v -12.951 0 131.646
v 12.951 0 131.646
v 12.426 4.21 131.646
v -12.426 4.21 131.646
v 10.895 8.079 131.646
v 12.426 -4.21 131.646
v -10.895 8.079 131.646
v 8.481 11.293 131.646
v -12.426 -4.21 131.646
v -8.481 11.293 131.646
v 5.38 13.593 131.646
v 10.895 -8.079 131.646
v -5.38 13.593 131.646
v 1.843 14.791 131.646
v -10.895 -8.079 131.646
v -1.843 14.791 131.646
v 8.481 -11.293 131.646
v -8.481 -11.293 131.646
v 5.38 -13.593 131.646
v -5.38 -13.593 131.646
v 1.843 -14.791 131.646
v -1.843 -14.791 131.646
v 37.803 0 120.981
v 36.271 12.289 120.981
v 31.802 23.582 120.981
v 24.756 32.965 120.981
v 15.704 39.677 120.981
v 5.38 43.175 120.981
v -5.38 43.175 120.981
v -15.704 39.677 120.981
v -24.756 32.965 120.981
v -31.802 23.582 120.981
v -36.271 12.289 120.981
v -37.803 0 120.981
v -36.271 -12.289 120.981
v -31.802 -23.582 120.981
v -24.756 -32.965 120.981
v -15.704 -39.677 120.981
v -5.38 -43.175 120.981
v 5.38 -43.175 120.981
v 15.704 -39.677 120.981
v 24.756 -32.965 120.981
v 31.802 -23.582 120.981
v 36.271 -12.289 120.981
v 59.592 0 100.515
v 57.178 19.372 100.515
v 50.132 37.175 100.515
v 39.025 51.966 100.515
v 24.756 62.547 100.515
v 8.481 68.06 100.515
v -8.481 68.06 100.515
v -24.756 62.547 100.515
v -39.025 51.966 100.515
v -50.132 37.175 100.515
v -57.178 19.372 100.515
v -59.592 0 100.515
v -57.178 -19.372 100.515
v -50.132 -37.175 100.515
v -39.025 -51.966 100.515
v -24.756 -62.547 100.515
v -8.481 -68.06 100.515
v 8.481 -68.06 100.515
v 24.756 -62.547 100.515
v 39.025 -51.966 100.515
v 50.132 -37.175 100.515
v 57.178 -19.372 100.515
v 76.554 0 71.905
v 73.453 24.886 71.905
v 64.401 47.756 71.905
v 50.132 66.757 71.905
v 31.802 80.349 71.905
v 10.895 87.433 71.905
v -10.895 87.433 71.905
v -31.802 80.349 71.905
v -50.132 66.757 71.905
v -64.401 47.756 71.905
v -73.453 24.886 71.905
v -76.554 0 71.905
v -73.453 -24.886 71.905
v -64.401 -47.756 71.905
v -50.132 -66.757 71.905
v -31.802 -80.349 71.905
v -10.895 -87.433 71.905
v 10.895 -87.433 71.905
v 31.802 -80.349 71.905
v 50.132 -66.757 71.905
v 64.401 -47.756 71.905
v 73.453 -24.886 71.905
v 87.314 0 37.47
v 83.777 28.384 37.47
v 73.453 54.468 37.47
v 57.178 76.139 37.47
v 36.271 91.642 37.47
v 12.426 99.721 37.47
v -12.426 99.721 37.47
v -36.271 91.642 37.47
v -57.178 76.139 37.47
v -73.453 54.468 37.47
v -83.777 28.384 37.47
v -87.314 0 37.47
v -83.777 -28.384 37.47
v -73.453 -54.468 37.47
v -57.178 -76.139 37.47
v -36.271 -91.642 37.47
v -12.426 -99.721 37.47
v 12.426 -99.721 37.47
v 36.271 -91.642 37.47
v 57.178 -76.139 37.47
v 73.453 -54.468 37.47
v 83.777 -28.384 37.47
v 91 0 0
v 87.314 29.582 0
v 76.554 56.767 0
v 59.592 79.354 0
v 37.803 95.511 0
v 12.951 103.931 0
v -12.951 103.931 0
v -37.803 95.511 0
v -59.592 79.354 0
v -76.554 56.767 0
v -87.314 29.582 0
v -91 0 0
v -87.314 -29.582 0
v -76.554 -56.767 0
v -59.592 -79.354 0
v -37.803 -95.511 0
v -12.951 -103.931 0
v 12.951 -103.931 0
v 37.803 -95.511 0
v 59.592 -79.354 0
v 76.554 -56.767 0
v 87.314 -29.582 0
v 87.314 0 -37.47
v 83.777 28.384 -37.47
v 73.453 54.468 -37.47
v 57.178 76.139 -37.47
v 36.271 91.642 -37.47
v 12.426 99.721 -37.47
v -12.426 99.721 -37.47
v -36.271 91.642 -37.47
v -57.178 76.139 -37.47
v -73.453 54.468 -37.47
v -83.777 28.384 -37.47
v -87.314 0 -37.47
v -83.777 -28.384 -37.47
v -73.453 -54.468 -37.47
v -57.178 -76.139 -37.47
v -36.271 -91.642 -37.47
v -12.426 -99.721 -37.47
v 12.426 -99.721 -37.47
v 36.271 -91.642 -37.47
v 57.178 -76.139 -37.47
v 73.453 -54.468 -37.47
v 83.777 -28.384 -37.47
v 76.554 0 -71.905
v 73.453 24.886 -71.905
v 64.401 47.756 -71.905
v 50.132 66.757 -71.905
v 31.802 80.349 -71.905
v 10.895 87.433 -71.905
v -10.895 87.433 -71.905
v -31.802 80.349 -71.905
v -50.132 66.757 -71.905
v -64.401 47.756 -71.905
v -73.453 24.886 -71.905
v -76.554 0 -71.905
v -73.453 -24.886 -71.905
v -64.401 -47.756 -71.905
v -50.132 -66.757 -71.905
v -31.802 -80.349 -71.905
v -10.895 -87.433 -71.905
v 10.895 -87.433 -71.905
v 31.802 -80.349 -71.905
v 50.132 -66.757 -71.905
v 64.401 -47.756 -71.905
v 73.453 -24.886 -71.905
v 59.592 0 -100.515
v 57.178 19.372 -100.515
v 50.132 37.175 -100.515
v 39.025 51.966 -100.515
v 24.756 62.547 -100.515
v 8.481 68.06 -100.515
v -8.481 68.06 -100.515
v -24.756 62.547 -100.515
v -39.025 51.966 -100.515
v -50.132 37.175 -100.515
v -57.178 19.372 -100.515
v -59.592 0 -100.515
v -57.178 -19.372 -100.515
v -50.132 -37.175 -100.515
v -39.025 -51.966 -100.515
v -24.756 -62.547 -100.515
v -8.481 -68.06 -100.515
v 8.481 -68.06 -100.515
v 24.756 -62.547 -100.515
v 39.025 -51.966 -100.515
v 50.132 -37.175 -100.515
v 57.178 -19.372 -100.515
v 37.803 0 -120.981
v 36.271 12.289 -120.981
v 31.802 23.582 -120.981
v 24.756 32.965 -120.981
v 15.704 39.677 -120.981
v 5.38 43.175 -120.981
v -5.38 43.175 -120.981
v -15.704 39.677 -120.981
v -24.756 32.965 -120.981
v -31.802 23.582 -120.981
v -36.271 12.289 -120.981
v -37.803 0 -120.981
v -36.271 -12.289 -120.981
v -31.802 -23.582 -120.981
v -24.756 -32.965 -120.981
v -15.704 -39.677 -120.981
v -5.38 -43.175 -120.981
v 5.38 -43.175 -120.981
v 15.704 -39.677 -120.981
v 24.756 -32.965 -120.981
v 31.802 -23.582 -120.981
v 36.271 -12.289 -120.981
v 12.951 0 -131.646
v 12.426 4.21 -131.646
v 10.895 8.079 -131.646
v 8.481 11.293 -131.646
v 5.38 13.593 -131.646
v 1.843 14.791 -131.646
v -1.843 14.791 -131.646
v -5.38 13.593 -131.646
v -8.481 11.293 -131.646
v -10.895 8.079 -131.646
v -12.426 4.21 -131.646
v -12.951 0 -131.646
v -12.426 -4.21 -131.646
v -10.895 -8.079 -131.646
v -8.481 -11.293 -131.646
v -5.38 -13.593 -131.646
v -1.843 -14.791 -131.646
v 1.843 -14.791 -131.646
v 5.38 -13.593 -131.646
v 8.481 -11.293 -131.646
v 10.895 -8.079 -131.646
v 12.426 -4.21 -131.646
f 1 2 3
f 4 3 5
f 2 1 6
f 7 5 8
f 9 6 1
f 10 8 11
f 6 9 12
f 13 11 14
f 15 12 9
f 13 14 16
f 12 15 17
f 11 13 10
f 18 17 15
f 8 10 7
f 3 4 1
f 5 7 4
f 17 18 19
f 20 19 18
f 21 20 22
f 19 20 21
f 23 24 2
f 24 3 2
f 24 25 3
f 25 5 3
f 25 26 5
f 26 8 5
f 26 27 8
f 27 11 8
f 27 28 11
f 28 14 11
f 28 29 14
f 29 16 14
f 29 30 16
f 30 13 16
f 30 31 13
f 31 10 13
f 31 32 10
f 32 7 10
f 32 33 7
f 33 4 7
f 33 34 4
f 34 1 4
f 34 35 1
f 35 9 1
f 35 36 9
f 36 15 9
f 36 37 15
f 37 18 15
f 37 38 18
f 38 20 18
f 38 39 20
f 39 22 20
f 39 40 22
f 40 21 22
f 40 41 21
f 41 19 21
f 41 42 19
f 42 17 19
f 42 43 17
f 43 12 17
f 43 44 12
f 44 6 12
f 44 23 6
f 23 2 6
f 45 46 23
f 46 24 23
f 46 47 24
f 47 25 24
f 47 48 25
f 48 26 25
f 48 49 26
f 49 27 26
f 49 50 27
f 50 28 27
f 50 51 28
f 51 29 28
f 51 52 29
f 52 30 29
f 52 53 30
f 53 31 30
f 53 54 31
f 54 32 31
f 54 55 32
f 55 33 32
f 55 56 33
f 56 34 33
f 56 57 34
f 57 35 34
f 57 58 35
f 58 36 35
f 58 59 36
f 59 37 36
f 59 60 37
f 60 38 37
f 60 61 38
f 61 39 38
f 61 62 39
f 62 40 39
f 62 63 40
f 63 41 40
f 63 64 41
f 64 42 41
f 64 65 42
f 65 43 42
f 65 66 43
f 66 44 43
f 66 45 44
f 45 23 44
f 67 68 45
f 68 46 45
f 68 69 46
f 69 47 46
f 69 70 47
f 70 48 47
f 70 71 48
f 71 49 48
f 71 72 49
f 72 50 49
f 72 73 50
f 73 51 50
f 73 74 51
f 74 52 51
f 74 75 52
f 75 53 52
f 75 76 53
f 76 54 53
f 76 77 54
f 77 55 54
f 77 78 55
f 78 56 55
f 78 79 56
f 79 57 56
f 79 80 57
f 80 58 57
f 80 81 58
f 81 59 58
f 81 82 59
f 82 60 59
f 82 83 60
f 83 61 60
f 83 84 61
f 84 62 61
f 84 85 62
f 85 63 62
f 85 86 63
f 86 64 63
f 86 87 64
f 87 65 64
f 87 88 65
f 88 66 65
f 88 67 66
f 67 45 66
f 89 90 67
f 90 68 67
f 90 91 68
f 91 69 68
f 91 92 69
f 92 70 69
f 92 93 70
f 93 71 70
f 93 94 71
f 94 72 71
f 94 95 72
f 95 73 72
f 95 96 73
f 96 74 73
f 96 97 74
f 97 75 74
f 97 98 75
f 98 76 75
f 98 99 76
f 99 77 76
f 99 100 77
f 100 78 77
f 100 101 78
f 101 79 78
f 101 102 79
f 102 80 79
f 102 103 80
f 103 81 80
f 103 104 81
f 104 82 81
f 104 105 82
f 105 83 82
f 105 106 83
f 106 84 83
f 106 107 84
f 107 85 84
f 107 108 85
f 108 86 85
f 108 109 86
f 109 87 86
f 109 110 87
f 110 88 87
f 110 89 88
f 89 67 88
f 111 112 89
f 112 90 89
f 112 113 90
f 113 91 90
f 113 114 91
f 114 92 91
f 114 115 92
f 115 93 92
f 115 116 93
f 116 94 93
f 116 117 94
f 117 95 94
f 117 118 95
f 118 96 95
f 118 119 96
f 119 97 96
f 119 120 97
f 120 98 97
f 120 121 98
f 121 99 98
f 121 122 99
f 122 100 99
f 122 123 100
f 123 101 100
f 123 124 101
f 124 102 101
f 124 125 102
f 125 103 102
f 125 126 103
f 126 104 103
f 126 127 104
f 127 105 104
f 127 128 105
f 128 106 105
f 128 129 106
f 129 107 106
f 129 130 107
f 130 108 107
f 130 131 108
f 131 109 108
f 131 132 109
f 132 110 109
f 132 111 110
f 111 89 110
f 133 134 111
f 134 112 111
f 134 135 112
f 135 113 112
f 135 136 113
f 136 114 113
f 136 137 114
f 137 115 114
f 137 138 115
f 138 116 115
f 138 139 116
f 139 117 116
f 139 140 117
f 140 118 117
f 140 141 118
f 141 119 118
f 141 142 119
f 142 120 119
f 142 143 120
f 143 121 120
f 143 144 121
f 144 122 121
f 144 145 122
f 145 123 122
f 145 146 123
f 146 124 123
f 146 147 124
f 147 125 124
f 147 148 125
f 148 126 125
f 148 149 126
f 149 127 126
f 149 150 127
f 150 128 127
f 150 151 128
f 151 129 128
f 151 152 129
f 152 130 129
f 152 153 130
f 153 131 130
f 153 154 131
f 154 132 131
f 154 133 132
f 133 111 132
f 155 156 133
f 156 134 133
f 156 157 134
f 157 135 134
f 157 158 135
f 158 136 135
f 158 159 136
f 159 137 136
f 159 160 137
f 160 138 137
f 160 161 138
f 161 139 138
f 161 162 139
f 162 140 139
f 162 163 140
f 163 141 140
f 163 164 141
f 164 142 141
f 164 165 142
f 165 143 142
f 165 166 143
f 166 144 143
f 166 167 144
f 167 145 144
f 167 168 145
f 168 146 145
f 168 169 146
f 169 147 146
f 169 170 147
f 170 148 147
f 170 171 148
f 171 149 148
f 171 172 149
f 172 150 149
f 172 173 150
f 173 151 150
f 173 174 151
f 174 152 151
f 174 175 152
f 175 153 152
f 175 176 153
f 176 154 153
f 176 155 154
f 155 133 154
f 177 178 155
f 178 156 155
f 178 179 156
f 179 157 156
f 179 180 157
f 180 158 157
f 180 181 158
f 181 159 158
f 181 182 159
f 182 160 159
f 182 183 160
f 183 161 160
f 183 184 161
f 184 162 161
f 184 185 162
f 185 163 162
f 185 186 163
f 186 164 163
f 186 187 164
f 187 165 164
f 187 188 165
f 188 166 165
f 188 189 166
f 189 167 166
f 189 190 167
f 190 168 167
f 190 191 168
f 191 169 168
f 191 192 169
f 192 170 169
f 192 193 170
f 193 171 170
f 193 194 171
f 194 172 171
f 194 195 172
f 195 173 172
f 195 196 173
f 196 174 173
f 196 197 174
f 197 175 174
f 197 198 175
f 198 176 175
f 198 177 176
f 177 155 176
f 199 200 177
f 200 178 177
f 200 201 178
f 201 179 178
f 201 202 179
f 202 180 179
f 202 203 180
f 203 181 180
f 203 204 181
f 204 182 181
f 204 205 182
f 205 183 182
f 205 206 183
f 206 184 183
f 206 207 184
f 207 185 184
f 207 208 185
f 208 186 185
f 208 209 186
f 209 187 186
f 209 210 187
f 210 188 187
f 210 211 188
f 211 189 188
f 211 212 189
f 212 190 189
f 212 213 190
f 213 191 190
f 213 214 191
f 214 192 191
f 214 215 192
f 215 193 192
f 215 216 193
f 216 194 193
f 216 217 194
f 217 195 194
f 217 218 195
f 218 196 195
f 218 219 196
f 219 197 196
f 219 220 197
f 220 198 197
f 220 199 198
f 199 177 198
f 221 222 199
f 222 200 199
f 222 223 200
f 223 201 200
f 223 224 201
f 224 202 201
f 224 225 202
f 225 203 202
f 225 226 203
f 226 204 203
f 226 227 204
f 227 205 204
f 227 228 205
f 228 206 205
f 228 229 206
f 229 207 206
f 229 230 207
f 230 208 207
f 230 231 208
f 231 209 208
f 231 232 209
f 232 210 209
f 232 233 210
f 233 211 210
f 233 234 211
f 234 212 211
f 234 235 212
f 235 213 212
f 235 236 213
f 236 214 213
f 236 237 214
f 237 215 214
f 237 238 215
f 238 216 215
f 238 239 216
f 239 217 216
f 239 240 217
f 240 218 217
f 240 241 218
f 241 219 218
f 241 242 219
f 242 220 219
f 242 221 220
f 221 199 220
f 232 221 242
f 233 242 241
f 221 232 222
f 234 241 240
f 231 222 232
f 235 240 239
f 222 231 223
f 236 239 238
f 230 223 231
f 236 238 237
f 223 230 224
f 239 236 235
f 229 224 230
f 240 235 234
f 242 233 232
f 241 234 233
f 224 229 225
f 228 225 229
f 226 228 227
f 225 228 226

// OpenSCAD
// Generated by SolidPython 1.0.1 on 2020-07-29 00:46:51


scale(v = [13, 15, 19]) {
	sphere(r = 7);
}
/***********************************************
*********      SolidPython code:      **********
************************************************
 
# import packages: SolidPython
from solid import *
from solid.utils import *
from itertools import chain, combinations, permutations


class Resize:

    def __init__(self, scad_file):
        self.scad_file = scad_file
        #self.scad_file = import_scad(scad_file)
        # cone/cylinder param:
        self.r1 = 0
        self.r2 = 0
        self.h = 0
        # rectangular prism param:
        self.w = 0
        self.l = 0
        # ellipse param:
        self.r = 0

    # import OpenScad code (file name corresponds to shape)


    # classify shape + parameters
    def assign(self, param1, param2, param3):
        if self.scad_file == 'cone.scad':
            self.r1 = param1
            self.r2 = param2
            self.h = param3
        elif self.scad_file == 'cylinder.scad':
            self.r1 = param1
            self.r2 = param2
            self.h = param3
        elif self.scad_file == 'rectangularPrism.scad':
            self.h = param1
            self.l = param2
            self.w = param3
        else:
            self.r = param1
            self.h = param2

    # resize parameters
    def iterate(self):
        x = range(3, 20, 2)
        i = 1
        if self.scad_file == 'cone.scad':
            tempList = list(permutations(x, 2))
            for temp in tempList:
                param1 = temp[0]
                param2 = temp[1]
                filepath = 'produced_scad_files/' + 'cone' + str(param1) + '_' + str(param2) + '_' + '.scad'
                scad_render_to_file(cylinder(h=param1, r1=param2, r2=0), filepath)

        elif self.scad_file == 'cylinder.scad':
            tempList = list(permutations(x, 3))
            for temp in tempList:
                param1 = temp[0]
                param2 = temp[1]
                filepath = 'produced_scad_files/' + 'cylinder' + str(param1) + '_' + str(param2) + '_' + '.scad'
                scad_render_to_file(cylinder(h=param1, r1=param2, r2=param2), filepath)

        elif self.scad_file == 'rectangularPrism.scad':
            tempList = list(permutations(x, 3))
            for temp in tempList:
                param1 = temp[0]
                param2 = temp[1]
                param3 = temp[2]
                filepath = 'produced_scad_files/' + 'rectangularPrism' + str(param1) + '_' + str(param2) + '_' + str(
                    param3) + '.scad'
                scad_render_to_file(cube(size=(param1, param2, param3)), filepath)

        elif self.scad_file == 'ellipse.scad':
            tempList = list(permutations(x, 4))
            for temp in tempList:
                param1 = temp[0]
                param2 = temp[1]
                param3 = temp[2]
                param4 = temp[3]
                filepath = 'produced_scad_files/' + 'ellipse' + str(param1) + '_' + str(param2) + '_' + str(param3) + '_' + str(param4) + '.scad'
                scad_render_to_file(scale([param1, param2, param3])(sphere(r=param4)), filepath)

    def render_to_scadfile(self):
        scad_render_to_file(scad, 'example.scad') 
 
************************************************/
